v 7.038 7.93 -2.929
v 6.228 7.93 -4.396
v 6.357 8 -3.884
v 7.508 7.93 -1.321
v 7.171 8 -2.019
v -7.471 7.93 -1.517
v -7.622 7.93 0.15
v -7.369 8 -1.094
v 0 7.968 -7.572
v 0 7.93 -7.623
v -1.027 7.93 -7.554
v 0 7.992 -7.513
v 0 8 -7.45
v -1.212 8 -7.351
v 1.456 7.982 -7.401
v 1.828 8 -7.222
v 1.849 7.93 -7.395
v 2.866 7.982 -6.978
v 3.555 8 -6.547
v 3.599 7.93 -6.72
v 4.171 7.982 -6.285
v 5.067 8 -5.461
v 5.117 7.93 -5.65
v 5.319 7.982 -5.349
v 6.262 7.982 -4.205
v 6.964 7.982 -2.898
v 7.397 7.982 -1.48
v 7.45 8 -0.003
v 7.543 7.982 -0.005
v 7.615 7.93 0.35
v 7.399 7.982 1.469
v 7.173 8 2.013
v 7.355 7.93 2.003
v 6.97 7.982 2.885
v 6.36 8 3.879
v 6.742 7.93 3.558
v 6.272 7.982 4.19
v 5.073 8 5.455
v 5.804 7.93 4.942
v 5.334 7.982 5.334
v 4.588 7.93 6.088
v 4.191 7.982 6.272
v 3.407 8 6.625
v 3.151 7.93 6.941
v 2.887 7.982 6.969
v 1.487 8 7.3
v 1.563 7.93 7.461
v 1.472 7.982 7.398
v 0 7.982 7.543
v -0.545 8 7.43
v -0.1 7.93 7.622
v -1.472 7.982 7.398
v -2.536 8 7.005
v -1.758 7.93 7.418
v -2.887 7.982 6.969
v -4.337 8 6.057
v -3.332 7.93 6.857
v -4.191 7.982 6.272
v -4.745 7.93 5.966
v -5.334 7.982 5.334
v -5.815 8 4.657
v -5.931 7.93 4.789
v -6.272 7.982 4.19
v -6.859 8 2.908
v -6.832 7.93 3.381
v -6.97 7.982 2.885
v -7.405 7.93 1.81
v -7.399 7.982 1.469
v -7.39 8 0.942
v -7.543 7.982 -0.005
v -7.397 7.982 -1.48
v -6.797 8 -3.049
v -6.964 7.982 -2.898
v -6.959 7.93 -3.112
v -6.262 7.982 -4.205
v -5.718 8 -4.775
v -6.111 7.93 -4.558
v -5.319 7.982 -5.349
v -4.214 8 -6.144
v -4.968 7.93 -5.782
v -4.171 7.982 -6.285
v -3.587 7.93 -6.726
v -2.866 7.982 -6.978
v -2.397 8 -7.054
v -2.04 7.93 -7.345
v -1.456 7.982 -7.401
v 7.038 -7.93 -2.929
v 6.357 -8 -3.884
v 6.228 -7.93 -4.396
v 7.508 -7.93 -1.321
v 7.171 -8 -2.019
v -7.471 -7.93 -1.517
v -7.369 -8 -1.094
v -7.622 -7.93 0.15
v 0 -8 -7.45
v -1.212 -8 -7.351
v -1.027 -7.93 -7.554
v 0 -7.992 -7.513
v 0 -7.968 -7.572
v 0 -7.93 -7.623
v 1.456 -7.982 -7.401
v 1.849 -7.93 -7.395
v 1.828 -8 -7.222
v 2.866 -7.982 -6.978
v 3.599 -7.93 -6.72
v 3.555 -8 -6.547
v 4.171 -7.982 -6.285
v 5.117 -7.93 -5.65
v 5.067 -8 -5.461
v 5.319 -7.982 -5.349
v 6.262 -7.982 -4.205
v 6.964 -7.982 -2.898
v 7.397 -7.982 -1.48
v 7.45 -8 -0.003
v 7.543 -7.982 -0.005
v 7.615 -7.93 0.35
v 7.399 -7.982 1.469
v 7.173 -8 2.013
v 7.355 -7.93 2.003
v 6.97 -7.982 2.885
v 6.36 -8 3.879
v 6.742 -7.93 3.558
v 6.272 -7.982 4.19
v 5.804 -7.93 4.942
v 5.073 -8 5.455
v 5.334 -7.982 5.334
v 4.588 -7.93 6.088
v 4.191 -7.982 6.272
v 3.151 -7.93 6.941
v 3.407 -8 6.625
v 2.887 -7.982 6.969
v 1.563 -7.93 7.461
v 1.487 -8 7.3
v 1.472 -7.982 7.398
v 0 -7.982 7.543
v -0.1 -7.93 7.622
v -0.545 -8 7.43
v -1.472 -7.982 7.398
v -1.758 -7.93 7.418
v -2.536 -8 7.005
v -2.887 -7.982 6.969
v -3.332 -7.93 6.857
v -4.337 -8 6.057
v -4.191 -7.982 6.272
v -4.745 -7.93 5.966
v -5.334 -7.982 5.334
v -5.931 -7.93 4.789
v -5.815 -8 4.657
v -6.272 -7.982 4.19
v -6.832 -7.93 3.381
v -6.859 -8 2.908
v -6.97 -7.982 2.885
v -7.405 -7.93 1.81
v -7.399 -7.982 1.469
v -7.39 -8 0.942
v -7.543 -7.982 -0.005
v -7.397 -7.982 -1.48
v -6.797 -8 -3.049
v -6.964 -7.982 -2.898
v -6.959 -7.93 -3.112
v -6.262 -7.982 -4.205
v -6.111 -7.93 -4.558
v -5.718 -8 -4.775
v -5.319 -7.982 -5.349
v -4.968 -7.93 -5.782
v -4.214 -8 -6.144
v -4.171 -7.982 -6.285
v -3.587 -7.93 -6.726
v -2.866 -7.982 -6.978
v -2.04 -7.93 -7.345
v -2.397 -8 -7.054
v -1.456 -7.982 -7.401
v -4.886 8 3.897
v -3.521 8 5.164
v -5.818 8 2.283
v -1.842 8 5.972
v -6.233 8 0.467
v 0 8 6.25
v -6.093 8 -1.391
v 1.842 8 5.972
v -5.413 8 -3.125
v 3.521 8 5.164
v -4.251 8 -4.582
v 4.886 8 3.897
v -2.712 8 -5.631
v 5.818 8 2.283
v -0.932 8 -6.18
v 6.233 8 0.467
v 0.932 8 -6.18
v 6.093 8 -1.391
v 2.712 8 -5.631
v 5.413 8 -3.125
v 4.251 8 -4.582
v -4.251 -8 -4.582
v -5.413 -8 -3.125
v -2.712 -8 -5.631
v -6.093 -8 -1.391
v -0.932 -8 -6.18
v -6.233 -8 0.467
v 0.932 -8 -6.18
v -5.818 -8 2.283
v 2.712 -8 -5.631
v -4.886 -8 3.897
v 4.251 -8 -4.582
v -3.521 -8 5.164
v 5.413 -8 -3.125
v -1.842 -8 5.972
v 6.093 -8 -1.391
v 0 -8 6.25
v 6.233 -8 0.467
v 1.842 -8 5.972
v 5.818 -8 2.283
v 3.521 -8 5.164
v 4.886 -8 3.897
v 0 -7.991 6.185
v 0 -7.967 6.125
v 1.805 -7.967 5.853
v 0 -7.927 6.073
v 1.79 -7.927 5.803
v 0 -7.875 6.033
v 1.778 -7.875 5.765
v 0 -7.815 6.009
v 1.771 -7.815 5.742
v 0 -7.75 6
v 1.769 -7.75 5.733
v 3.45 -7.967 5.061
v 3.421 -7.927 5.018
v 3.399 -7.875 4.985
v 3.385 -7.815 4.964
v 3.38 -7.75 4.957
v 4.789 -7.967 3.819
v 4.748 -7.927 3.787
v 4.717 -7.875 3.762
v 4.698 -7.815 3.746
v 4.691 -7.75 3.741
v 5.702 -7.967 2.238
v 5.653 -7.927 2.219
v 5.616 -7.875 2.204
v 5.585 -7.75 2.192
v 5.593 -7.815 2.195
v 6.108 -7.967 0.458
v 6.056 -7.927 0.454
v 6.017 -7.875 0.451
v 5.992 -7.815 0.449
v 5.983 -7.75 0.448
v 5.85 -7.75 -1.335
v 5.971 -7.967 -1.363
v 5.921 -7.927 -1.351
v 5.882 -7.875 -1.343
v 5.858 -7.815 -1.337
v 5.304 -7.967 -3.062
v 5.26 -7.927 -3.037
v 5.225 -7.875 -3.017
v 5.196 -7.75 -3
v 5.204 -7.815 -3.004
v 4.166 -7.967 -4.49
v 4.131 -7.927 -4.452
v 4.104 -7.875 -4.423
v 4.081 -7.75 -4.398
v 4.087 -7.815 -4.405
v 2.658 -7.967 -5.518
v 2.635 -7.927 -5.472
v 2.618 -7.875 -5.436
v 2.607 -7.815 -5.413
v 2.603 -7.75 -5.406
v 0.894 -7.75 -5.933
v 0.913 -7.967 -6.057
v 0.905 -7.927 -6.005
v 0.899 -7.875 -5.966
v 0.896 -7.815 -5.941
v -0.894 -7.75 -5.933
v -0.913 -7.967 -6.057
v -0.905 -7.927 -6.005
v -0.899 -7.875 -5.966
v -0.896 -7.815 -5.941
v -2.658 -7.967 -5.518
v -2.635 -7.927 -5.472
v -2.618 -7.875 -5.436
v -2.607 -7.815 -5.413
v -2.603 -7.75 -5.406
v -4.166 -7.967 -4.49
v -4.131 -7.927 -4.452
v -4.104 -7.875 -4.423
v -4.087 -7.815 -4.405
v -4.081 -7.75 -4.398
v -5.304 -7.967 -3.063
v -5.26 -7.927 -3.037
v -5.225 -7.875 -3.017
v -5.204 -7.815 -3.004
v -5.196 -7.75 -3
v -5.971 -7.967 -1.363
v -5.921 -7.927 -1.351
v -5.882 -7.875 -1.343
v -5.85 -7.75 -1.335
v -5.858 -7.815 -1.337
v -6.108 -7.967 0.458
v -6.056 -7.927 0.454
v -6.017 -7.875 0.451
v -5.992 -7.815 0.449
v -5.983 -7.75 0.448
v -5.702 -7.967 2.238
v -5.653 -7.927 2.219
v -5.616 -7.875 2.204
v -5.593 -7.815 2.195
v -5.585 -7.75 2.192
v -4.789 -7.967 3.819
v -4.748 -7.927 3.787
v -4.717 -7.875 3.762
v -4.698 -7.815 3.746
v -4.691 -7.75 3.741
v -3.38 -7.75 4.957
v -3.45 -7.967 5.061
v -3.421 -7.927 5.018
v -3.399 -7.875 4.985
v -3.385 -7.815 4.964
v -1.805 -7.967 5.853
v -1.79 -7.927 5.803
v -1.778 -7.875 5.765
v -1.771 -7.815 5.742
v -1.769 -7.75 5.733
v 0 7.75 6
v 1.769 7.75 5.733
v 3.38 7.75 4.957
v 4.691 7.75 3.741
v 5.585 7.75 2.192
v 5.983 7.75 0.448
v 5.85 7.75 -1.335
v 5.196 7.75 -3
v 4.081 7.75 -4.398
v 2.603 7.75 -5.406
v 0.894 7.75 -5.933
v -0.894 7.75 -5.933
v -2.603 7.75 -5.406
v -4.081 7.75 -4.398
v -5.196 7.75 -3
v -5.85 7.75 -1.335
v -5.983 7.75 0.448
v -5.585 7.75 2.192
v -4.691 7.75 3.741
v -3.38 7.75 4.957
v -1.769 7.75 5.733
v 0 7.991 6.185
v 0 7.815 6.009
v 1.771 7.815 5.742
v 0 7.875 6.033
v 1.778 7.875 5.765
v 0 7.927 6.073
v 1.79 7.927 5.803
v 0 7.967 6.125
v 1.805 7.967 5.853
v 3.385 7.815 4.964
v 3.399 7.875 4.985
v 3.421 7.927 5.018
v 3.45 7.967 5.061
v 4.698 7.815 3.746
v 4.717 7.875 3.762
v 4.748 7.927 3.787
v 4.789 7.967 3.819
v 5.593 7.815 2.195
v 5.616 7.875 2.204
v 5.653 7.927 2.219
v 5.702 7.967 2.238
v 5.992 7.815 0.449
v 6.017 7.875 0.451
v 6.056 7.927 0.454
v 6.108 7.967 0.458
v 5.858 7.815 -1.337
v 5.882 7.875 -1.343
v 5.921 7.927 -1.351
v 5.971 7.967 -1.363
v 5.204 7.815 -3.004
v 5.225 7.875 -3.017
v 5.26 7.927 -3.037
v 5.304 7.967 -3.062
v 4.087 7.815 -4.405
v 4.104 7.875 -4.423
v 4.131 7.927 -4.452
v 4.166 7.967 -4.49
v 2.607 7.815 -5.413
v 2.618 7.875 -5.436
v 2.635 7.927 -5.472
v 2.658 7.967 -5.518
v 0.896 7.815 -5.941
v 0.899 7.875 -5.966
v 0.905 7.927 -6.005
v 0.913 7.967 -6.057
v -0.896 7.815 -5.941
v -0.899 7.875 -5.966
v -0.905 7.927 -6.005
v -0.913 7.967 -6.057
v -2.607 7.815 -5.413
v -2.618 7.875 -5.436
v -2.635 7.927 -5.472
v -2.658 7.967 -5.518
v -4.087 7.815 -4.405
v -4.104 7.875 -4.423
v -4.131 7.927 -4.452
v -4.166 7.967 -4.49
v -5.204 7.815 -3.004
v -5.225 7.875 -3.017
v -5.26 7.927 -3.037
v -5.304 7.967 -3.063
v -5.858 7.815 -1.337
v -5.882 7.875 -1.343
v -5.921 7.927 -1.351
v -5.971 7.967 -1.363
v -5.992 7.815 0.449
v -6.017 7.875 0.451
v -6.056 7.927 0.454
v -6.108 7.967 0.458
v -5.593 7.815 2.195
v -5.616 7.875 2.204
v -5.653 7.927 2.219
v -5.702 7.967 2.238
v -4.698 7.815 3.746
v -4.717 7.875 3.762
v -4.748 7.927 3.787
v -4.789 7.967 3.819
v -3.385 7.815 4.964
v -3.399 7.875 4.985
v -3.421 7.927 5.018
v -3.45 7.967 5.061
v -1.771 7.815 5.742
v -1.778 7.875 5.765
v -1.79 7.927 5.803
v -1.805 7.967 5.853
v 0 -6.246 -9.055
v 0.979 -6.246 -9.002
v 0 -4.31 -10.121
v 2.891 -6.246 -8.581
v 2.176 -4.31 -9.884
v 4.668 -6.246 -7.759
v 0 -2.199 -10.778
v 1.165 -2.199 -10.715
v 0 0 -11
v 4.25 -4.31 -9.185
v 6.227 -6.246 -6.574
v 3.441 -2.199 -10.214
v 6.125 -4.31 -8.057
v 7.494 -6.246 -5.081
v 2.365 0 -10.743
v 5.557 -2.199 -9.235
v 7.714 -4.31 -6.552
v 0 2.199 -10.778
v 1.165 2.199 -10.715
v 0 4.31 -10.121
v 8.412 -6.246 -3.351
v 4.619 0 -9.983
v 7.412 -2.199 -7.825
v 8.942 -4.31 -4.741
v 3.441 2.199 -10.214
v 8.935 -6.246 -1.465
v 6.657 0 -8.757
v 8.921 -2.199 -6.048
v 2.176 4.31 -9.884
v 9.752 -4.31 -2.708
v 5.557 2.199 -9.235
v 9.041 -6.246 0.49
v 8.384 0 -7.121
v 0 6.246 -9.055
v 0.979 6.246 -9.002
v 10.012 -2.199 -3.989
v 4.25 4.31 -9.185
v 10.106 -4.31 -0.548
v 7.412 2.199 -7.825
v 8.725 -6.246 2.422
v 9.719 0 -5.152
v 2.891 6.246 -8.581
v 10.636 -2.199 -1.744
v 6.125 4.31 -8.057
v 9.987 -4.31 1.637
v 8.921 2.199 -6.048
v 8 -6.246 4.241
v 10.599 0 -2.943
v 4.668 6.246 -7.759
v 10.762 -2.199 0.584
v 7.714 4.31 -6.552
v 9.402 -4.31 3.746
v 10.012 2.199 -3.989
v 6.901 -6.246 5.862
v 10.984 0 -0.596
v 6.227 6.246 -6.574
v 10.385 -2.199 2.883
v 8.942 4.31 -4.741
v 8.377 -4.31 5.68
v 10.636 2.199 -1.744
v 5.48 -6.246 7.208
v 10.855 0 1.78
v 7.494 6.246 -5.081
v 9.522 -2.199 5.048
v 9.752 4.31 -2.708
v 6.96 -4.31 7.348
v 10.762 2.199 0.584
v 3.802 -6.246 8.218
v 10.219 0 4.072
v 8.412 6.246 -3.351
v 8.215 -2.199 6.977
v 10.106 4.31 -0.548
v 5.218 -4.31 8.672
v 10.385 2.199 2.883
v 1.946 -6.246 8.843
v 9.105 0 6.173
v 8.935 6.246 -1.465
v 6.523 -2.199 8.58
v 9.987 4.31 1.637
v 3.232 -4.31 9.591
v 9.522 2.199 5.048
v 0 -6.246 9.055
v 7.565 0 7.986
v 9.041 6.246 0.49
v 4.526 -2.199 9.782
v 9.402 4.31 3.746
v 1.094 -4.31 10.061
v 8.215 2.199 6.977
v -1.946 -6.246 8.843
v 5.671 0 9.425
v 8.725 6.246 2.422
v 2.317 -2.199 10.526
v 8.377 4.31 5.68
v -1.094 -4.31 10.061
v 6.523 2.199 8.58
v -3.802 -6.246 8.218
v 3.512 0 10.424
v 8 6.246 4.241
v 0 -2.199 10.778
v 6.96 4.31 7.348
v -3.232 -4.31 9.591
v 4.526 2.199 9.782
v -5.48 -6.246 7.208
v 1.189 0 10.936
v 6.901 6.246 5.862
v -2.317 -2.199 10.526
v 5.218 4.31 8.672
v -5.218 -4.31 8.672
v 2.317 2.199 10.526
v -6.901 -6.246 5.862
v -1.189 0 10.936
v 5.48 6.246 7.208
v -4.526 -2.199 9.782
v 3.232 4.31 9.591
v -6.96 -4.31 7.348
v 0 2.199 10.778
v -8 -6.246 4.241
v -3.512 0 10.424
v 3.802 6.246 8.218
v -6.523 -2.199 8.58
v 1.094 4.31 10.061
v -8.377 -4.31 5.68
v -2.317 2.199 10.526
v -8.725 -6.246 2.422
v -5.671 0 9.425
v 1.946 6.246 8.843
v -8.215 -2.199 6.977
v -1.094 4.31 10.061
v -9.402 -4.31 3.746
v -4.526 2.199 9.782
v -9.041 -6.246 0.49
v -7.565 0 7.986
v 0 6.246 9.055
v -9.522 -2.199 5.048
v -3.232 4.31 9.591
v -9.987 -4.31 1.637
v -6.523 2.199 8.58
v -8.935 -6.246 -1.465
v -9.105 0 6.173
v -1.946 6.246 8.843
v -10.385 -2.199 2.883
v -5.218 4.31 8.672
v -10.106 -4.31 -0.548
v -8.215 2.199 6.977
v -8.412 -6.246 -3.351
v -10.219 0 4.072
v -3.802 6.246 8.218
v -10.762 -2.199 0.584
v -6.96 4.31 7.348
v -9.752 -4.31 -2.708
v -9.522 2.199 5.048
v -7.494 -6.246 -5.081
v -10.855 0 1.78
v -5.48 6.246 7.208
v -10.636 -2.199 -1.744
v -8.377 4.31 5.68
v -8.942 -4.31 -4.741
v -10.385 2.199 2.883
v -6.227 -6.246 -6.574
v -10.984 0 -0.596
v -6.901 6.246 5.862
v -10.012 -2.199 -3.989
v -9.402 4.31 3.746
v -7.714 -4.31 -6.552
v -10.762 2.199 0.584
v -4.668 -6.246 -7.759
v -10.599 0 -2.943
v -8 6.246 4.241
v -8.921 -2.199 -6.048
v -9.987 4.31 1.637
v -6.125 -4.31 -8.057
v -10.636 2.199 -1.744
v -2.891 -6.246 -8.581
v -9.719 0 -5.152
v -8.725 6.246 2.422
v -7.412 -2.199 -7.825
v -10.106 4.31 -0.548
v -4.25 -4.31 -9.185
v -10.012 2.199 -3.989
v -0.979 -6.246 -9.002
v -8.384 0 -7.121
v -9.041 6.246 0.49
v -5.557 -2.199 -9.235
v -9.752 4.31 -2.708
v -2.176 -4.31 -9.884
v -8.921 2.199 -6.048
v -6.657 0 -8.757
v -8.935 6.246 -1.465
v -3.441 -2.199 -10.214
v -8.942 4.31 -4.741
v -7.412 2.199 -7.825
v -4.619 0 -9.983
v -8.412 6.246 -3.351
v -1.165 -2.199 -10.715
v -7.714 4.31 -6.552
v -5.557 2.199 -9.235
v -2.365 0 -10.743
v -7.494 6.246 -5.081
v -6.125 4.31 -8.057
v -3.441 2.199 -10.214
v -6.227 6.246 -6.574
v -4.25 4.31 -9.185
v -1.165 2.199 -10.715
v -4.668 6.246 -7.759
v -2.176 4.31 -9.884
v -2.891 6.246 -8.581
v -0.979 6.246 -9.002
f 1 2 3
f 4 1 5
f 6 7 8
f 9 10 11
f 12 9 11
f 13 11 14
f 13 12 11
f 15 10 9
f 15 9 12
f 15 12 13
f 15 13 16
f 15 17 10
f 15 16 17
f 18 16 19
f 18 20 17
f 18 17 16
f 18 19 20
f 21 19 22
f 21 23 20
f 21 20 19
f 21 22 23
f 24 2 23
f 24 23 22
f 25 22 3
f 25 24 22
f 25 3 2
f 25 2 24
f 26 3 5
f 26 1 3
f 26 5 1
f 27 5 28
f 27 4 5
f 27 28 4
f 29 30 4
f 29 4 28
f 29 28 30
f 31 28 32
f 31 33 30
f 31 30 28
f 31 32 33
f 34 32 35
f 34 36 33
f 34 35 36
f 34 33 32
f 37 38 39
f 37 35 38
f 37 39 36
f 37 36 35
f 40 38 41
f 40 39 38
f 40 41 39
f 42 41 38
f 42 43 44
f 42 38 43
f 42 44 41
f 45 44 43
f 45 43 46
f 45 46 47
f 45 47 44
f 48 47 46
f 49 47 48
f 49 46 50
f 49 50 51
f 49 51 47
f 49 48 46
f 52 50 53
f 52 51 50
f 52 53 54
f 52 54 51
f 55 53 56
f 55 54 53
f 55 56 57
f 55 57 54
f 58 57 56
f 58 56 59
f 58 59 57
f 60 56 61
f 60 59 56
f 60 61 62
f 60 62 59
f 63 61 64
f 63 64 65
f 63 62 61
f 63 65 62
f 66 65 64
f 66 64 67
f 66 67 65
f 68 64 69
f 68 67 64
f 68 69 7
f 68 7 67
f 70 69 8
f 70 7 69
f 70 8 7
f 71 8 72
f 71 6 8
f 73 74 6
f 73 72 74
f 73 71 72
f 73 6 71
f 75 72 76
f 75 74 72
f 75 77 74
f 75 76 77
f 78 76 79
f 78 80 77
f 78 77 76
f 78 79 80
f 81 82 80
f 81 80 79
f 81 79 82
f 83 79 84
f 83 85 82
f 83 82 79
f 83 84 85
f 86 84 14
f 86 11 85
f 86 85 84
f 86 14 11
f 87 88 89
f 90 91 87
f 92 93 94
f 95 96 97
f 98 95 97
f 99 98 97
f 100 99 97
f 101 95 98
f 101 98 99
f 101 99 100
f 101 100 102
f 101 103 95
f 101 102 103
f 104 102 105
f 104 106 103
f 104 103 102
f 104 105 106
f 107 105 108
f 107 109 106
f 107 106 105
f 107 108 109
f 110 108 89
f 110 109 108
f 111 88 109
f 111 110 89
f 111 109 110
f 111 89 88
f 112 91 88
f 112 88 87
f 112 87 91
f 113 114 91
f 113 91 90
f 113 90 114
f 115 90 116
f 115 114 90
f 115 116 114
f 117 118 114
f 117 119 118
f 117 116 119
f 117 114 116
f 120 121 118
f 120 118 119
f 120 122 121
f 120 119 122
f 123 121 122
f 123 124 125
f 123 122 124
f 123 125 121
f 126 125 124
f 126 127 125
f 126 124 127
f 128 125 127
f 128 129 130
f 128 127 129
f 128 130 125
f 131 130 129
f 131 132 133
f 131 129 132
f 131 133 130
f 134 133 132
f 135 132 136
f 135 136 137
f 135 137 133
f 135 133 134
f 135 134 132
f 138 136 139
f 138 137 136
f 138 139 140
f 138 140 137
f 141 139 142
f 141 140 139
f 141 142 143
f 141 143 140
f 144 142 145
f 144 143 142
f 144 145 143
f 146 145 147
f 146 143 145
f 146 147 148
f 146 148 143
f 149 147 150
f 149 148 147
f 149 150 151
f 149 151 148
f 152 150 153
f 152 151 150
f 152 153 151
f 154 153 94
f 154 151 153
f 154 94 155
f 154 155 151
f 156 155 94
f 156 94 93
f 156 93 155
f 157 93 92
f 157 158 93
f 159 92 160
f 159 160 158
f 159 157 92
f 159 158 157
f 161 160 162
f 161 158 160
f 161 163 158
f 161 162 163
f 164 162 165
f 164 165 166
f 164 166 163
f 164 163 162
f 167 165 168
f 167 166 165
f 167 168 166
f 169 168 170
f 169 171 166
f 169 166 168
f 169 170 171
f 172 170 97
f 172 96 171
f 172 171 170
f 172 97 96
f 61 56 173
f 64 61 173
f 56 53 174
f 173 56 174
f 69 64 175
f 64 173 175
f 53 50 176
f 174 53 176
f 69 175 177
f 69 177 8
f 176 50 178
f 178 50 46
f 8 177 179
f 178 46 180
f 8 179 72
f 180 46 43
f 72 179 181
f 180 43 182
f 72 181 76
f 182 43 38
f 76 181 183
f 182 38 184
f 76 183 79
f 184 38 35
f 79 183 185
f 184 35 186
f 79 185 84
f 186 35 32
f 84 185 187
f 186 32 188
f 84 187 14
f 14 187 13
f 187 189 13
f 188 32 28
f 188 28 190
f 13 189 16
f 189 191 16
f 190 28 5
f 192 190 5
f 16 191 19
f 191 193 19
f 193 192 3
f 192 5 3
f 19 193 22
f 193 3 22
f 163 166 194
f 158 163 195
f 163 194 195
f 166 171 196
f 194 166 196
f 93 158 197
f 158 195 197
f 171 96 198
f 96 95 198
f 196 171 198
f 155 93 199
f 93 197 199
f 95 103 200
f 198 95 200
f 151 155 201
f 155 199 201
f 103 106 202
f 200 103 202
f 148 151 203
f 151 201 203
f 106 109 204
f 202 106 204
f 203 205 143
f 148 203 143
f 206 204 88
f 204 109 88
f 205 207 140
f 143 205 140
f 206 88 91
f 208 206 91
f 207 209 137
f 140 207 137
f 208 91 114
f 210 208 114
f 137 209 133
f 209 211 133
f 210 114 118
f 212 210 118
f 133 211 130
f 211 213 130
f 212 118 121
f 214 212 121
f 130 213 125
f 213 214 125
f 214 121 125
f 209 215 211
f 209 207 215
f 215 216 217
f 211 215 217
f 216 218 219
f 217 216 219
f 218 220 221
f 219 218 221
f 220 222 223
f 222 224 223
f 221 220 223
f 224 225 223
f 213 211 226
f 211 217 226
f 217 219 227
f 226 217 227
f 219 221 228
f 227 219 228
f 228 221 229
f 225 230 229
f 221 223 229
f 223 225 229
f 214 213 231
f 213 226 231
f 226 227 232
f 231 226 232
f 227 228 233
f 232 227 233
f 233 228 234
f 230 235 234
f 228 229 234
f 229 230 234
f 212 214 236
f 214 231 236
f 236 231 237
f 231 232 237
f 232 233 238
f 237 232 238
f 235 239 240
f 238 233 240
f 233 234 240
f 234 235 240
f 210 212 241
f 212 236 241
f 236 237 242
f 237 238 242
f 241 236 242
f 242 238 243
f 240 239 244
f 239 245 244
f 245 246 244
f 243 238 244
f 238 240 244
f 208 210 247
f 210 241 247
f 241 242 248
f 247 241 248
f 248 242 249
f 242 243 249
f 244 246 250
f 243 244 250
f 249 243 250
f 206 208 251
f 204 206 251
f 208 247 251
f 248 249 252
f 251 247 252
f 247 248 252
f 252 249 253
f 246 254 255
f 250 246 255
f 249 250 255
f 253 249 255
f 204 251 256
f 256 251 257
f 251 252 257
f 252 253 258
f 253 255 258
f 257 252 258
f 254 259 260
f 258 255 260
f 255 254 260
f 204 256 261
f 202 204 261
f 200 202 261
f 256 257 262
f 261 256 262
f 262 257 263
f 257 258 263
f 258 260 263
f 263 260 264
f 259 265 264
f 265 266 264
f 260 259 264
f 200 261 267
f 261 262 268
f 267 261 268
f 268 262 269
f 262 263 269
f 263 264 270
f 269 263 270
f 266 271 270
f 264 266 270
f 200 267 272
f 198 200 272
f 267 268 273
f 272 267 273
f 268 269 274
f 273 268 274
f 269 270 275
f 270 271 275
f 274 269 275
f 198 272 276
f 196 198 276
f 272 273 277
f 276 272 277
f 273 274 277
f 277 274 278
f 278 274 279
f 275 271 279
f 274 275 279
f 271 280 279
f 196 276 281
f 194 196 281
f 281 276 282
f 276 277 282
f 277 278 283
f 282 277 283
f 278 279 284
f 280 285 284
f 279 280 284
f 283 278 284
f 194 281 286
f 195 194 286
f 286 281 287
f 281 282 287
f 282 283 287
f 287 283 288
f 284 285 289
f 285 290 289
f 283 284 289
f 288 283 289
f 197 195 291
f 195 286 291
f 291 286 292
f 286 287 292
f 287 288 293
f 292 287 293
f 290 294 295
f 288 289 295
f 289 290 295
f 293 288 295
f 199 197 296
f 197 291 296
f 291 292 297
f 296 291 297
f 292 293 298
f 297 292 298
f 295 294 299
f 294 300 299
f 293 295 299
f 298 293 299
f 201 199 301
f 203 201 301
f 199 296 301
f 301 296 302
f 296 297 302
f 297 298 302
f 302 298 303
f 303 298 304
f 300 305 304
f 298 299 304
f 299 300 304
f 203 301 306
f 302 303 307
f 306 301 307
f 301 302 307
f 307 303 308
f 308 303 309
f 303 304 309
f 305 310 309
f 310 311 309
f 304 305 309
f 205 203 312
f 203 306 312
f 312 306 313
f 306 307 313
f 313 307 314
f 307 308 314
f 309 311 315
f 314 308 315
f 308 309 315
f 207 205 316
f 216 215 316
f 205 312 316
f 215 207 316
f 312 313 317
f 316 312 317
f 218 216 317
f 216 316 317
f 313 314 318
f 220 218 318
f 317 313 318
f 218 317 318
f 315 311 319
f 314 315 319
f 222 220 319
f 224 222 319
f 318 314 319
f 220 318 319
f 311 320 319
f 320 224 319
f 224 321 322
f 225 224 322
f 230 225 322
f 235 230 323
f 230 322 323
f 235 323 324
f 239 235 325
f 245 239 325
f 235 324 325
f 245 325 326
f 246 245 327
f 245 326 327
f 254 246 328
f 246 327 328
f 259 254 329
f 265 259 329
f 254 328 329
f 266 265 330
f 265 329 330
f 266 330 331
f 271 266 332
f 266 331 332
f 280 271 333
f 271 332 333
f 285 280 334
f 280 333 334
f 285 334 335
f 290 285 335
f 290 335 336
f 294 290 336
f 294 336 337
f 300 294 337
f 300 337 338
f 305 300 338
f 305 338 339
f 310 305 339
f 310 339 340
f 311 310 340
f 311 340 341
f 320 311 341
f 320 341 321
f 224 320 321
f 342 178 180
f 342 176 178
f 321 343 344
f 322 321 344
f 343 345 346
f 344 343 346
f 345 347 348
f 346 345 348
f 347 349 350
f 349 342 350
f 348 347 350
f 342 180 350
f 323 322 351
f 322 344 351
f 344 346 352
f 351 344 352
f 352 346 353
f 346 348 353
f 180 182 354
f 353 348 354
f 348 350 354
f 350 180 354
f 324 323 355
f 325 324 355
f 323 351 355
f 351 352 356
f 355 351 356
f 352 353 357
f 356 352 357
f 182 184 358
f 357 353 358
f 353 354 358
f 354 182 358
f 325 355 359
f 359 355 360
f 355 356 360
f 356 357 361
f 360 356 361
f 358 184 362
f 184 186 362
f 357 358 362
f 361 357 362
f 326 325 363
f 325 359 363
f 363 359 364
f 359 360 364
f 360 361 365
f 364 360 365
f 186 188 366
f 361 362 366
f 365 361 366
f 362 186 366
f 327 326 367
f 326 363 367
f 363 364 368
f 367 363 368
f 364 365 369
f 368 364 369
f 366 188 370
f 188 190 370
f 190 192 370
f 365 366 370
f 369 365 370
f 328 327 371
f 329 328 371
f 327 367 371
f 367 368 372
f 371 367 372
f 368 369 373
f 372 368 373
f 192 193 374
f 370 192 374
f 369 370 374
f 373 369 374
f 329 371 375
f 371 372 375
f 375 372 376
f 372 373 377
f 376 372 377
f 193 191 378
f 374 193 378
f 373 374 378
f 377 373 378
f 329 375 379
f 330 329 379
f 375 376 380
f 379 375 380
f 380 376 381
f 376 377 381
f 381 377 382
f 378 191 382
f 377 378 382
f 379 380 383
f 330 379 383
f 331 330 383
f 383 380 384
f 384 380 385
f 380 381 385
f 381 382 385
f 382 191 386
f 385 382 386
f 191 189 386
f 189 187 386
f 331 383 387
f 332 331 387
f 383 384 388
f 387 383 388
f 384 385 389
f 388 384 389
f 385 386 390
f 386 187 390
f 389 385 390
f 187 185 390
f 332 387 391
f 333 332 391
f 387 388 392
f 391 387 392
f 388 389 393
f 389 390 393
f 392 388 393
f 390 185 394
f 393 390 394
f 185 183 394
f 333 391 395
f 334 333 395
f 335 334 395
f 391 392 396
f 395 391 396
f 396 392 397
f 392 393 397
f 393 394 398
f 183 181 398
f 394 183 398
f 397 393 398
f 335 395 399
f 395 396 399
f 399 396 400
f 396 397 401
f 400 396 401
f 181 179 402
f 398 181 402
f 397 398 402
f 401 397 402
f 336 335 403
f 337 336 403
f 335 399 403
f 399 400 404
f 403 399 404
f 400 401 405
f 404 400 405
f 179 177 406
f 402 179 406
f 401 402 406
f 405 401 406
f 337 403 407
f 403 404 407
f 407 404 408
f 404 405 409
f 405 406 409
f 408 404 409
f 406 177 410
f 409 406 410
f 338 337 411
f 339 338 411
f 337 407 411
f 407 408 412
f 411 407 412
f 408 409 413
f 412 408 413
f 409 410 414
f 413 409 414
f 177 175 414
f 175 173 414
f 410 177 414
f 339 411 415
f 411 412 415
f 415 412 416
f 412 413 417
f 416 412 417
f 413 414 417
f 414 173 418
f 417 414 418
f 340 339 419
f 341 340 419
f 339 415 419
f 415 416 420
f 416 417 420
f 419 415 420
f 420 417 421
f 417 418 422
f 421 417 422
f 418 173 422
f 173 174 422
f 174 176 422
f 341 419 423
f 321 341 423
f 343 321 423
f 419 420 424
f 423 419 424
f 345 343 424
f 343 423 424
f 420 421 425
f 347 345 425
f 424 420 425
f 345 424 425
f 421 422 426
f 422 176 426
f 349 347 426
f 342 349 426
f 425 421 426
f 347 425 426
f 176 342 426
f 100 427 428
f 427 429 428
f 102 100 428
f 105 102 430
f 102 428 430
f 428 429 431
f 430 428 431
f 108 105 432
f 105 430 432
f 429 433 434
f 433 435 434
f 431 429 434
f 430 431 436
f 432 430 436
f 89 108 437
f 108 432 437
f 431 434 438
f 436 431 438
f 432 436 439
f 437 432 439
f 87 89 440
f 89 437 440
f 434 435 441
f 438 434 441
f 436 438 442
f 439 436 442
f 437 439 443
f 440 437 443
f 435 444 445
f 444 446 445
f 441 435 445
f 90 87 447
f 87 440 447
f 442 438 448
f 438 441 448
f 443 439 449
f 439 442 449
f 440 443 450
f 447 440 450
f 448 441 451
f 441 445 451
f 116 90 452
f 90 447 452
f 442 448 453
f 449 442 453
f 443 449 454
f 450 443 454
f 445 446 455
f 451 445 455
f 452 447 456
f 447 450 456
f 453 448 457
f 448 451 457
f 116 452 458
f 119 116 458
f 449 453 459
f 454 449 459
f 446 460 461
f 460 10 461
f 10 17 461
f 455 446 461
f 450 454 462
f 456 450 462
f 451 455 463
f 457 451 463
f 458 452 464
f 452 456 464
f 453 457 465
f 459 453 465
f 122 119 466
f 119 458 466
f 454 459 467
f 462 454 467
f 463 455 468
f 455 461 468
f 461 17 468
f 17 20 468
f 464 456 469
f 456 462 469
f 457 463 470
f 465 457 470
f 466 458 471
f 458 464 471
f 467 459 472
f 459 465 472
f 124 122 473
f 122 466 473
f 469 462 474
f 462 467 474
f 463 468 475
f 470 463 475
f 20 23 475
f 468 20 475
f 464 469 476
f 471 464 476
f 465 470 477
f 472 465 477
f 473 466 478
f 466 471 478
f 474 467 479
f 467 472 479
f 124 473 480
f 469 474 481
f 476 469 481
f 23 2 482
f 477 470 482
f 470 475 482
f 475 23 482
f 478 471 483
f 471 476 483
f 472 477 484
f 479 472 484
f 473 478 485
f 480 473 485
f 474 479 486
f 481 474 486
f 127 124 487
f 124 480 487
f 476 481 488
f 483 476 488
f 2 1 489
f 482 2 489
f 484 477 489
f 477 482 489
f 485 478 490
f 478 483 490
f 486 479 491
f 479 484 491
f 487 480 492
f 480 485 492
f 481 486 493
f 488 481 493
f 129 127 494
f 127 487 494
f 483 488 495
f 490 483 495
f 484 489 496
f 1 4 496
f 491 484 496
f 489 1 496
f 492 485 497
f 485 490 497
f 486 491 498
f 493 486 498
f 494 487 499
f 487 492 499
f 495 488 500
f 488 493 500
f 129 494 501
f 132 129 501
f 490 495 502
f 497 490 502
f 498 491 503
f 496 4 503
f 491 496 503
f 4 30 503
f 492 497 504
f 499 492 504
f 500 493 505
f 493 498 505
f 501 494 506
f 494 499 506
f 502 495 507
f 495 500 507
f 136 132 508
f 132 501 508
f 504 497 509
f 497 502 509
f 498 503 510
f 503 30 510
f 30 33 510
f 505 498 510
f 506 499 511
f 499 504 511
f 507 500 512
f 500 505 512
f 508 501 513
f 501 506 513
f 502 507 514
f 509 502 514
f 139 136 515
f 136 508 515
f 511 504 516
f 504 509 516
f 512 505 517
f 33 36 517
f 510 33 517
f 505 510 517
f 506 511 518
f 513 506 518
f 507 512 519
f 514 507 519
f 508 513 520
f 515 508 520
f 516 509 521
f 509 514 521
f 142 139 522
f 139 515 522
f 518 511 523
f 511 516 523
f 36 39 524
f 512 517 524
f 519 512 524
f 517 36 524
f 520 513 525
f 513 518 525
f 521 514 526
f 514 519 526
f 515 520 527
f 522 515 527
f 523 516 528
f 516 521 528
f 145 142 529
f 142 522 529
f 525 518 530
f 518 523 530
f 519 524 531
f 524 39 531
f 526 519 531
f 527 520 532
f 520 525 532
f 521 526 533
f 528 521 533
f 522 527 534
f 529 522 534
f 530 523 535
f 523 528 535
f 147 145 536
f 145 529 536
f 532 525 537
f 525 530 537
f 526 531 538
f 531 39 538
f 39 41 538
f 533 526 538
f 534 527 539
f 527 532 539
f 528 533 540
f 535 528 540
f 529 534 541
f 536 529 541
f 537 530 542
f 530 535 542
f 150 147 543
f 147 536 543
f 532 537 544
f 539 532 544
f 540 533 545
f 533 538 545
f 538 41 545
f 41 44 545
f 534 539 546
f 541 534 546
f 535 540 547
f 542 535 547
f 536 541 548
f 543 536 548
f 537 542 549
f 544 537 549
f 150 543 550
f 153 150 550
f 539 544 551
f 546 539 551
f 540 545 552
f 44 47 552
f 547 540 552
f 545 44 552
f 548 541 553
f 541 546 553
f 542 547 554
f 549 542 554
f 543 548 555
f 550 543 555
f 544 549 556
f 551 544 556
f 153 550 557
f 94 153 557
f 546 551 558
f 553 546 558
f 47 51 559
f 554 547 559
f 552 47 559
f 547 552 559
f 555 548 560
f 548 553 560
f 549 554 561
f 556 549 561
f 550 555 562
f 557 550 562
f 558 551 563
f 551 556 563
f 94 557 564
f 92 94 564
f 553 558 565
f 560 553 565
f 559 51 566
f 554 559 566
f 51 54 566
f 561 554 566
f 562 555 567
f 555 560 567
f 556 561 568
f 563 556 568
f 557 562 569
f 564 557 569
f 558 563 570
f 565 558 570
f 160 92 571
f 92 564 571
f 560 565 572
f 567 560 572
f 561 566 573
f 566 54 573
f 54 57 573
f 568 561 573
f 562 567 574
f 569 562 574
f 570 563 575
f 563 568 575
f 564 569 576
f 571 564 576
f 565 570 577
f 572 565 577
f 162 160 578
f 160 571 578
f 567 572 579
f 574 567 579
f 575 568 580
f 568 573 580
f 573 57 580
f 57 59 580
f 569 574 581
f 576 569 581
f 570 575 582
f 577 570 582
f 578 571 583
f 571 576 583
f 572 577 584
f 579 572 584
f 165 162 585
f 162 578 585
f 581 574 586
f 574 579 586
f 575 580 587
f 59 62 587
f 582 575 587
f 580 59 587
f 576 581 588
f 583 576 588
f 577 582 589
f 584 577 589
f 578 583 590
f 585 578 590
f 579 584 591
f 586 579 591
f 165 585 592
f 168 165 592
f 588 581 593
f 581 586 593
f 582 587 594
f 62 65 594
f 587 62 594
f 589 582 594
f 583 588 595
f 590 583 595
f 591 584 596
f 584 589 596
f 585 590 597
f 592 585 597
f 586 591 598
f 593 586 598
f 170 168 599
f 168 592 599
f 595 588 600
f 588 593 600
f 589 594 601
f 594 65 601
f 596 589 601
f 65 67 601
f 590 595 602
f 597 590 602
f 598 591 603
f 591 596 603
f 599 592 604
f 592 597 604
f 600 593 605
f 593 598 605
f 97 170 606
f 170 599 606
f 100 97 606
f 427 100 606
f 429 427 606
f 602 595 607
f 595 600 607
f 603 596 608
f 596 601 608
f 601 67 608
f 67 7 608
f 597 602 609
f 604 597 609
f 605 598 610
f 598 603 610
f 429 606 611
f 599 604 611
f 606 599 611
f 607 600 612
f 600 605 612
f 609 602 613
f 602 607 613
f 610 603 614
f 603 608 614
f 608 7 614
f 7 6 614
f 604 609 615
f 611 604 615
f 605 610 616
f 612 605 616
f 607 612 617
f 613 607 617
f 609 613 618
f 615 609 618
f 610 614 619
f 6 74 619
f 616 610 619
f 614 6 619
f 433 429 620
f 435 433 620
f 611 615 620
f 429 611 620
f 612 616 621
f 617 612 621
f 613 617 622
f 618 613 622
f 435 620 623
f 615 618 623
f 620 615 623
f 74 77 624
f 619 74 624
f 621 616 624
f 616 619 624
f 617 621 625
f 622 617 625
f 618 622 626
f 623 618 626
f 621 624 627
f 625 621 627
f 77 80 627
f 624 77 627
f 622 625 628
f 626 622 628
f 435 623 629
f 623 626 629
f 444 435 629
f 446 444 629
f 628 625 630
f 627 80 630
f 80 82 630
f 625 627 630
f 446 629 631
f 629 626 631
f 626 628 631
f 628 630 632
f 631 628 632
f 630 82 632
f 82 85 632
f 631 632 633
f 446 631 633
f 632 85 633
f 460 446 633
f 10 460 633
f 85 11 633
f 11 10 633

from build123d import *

# Parameters (mm, degrees)
SKETCH2_R          = 6
CUT_EXTRUDE1_DEPTH = 23.315913604
FILLET1_R          = 0.25


with BuildPart() as part:
    # Sketch1 → Revolve2 (revolve)
    with BuildSketch(Plane(origin=(0, 0, 0), x_dir=(0, 0, -1), z_dir=(1, 0, 0))):
        with BuildLine():
            Line((0, -8), (7.549834435, -8))
            ThreePointArc((7.549834435, -8), (11, 0), (7.549834435, 8))
            Line((7.549834435, 8), (0, 8))
            Line((0, 8), (0, -8))
        make_face()
    revolve(axis=Axis((0, 11, 0), (0, -1, 0)))

    # Sketch2 → Cut-Extrude1 (cut, through all)
    with BuildSketch(Plane(origin=(0, 8, 0), x_dir=(1, 0, 0), z_dir=(0, 1, 0))):
        with Locations(Location((0, 0, 0), (0, 0, 270))):
            Circle(SKETCH2_R)
    extrude(amount=-CUT_EXTRUDE1_DEPTH, mode=Mode.SUBTRACT)

    # Fillet1
    fillet1_edges = [part.edges().sort_by_distance(p)[0] for p in [
        (0, -8, -6),
        (0, 8, -6),
        (0, -8, 7.549834435),
        (0, 8, 7.549834435),
    ]]
    fillet(fillet1_edges, radius=FILLET1_R)


solid = part.part
